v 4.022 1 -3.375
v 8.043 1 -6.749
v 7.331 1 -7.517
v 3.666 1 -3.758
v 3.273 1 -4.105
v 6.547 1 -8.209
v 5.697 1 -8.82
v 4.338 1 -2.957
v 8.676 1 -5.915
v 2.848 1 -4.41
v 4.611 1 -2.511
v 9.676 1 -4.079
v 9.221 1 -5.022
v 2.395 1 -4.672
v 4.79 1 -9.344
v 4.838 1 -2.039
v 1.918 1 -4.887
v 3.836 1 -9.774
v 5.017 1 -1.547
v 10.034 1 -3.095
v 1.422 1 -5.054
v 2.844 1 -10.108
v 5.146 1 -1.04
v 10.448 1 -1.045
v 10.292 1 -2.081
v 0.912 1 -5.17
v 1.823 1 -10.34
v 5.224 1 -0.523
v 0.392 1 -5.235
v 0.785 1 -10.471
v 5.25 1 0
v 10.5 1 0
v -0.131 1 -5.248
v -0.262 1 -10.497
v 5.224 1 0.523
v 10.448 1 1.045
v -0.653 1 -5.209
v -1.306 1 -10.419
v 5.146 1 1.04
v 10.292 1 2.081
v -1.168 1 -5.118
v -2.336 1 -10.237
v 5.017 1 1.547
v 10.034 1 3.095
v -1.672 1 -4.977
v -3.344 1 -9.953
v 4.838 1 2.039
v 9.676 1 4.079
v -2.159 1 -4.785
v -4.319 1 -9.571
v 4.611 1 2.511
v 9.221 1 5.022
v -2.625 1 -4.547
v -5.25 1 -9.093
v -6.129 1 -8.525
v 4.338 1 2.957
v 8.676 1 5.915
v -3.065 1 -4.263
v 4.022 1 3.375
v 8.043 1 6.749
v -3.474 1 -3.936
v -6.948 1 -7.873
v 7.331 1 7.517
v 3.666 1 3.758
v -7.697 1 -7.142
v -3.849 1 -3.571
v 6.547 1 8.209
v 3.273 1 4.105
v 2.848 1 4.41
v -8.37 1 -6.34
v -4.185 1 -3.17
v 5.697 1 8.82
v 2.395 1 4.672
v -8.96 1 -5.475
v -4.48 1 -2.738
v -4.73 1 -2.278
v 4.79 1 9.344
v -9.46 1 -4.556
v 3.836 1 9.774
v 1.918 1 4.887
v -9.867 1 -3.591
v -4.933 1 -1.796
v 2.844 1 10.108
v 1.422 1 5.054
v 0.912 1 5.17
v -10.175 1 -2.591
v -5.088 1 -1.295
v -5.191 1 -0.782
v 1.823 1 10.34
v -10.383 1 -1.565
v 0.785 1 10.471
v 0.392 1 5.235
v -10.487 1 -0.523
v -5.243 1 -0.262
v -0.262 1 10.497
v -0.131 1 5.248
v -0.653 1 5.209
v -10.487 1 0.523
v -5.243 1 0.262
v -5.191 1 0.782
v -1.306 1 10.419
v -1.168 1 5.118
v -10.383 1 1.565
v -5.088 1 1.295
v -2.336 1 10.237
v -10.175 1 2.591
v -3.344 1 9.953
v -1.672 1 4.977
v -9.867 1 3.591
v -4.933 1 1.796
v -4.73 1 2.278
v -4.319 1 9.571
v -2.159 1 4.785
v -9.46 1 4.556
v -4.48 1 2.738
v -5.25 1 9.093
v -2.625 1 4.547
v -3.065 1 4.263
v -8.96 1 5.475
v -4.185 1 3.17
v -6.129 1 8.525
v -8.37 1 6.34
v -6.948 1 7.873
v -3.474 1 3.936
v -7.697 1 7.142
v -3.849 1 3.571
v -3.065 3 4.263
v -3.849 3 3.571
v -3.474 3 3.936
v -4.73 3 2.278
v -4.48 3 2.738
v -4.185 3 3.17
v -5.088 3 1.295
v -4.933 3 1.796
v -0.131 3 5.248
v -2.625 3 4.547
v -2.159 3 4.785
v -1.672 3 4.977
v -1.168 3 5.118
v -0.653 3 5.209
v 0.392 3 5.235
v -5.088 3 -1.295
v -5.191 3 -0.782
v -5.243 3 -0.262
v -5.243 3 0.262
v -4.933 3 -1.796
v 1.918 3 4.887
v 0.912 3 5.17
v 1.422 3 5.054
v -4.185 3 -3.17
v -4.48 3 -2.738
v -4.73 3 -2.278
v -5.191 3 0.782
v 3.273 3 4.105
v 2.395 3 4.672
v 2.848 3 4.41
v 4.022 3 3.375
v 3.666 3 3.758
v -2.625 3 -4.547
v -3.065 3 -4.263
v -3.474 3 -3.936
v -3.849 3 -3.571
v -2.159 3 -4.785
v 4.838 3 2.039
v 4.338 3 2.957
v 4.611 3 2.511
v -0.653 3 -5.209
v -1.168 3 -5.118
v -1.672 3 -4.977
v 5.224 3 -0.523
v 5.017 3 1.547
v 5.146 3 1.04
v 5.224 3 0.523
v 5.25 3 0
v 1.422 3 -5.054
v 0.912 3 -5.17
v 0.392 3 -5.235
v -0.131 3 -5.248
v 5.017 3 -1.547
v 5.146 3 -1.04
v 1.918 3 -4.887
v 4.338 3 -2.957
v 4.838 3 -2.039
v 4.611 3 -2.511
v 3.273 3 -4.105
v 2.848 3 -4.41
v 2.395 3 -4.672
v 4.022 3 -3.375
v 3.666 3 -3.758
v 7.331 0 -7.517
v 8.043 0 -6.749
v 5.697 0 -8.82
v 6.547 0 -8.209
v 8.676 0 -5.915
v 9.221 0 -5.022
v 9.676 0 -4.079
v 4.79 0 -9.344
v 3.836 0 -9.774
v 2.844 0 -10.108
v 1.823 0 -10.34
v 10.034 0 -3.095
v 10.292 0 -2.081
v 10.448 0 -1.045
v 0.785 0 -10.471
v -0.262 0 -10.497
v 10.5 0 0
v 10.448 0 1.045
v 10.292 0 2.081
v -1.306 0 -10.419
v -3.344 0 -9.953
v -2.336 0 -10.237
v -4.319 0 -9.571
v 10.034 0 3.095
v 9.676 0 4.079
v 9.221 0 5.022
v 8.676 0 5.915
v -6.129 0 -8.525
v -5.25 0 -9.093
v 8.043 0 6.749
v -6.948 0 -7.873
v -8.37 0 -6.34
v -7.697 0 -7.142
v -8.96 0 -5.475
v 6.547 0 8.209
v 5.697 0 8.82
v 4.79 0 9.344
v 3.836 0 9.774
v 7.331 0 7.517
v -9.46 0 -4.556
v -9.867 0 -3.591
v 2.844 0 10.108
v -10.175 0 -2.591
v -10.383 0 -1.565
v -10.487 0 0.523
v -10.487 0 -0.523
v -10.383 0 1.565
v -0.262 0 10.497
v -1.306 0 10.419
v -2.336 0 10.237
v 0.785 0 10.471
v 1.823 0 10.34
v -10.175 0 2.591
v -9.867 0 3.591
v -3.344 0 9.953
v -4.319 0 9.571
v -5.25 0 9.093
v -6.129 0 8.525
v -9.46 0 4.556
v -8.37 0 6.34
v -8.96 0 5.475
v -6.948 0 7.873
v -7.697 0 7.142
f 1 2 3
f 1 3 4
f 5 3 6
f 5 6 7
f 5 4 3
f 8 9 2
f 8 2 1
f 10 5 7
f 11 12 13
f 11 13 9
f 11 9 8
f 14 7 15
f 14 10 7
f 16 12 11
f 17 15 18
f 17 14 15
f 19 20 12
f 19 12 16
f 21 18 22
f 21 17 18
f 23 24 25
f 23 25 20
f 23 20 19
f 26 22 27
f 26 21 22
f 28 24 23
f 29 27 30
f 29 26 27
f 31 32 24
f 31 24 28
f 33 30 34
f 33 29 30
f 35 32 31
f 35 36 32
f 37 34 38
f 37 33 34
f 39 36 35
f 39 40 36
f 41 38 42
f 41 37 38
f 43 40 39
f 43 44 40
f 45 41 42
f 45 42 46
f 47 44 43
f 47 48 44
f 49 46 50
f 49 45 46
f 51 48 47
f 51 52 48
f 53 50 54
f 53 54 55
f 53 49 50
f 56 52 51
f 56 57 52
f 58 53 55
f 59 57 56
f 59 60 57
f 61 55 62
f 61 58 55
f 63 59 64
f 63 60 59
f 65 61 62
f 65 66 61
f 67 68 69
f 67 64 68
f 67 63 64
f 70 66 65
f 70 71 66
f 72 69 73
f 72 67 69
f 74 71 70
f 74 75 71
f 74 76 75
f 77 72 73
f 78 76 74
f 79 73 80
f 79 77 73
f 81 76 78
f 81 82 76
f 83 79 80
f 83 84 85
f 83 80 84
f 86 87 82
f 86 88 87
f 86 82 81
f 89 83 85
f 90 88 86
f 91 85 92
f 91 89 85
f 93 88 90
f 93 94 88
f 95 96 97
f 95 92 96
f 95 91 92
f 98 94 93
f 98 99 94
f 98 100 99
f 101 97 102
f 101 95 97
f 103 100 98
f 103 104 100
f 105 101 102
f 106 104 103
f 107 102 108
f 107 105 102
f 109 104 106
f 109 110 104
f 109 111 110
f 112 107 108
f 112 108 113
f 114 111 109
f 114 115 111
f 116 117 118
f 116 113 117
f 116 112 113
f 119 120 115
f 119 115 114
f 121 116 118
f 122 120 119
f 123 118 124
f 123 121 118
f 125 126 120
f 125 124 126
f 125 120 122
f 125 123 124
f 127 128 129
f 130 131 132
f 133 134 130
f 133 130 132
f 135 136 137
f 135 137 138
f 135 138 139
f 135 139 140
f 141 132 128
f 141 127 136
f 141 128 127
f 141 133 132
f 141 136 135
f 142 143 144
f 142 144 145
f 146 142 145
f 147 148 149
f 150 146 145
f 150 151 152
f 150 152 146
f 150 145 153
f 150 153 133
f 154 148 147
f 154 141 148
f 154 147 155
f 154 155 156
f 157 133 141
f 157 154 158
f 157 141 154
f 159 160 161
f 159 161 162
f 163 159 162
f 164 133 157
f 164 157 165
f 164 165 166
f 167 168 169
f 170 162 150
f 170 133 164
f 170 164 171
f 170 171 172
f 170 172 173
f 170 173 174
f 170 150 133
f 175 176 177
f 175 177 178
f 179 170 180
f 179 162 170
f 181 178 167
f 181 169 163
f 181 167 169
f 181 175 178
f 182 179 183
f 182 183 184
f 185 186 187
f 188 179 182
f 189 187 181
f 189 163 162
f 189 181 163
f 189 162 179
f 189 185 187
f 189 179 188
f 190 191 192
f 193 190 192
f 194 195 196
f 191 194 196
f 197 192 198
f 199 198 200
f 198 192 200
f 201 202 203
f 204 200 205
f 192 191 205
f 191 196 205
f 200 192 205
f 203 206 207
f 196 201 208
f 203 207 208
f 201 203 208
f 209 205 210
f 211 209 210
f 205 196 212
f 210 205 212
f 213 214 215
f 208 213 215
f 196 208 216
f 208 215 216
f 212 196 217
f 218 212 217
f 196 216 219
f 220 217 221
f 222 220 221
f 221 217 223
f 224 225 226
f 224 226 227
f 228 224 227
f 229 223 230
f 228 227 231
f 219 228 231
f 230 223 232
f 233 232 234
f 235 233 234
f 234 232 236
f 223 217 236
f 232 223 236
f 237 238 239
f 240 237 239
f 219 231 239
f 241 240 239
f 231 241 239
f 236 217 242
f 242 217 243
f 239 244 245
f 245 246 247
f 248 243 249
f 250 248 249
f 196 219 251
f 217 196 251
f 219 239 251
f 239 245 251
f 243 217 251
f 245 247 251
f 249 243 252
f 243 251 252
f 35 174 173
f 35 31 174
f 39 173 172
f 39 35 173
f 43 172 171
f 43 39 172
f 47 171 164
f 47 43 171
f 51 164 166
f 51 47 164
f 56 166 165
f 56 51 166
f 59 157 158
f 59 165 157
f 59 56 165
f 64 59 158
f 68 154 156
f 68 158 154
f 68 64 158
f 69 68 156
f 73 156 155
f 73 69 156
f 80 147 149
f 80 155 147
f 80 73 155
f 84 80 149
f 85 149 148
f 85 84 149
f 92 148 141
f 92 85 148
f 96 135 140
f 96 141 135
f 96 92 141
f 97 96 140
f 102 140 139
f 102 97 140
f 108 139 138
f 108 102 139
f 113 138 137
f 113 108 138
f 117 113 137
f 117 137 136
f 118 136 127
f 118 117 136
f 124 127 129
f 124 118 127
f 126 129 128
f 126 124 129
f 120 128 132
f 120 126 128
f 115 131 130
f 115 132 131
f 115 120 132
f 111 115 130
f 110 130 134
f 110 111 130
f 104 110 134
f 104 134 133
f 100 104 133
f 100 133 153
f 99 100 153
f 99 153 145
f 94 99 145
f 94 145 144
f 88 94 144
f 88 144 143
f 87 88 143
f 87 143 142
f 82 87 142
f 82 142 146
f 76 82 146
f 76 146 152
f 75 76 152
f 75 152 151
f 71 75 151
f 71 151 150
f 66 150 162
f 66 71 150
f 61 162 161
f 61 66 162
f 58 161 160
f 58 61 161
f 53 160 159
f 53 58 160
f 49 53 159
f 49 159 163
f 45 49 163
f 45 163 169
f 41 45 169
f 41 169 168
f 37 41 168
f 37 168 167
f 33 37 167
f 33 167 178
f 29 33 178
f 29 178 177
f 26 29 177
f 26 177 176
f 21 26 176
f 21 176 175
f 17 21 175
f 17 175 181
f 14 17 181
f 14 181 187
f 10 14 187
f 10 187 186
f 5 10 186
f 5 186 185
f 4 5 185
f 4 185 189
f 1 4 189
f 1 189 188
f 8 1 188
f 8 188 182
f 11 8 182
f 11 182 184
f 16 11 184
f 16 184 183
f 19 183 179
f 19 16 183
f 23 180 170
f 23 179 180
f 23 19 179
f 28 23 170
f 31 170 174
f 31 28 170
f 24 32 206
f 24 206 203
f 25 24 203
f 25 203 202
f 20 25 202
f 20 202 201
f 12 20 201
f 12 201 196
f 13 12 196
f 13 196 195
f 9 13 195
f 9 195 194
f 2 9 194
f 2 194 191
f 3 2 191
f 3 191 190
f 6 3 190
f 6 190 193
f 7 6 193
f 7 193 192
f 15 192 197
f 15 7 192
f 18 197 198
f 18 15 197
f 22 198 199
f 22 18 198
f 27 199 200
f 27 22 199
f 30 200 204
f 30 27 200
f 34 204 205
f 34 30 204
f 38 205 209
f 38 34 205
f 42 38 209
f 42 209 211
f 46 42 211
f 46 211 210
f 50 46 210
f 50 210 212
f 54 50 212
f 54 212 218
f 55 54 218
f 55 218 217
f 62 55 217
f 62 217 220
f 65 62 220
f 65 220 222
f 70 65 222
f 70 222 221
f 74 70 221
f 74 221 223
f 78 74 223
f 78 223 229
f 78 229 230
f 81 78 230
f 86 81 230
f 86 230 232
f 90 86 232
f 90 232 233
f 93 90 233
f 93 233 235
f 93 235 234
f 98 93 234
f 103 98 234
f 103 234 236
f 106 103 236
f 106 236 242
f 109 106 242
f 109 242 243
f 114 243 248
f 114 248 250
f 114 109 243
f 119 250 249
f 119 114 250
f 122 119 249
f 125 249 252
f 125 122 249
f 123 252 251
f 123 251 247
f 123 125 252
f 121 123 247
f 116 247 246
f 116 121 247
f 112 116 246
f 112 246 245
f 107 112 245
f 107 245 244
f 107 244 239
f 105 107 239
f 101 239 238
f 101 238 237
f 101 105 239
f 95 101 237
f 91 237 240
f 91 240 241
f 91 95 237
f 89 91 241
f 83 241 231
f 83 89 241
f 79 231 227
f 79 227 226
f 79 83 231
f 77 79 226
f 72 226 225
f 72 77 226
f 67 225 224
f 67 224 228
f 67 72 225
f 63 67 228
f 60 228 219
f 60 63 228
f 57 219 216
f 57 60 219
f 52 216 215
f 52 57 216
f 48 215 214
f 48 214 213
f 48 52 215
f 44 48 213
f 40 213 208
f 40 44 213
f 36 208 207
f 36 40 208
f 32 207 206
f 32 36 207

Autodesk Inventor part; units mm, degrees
ref_plane "YZ Plane" through (0, 0, 0) normal (1, 0, 0) x (0, 1, 0)
ref_plane "XZ Plane" through (0, 0, 0) normal (0, 1, 0) x (-1, 0, 0)
ref_plane "XY Plane" through (0, 0, 0) normal (0, 0, 1) x (1, 0, 0)
sketch "Sketch1" plane through (0, 0, 0) normal (0, 1, 0) x (-1, 0, 0)
  circle A0 centre (0, 0) radius 13
  dimension "d0" = 26
extrude "Extrusion1" add sketch "Sketch1" along normal blind 1
sketch "Sketch2" plane through (0, 1, 0) normal (0, 1, 0) x (1, 0, 0)
  circle A0 centre (0, 0) radius 5.25
  dimension "d3" = 10.5
extrude "Extrusion2" add sketch "Sketch2" along normal blind 2
sketch "Sketch3" plane through (0, 1, 0) normal (0, 1, 0) x (1, 0, 0)
  circle A0 centre (0, 0) radius 5.25 projected
  circle A1 centre (0, 0) radius 13 projected
  circle A2 centre (0, 0) radius 10.5
  dimension "d6" = 21
extrude "Extrusion3" cut sketch "Sketch3" against normal blind 2 contours A1
properties part number "plastic washer for washer magnet bases"
